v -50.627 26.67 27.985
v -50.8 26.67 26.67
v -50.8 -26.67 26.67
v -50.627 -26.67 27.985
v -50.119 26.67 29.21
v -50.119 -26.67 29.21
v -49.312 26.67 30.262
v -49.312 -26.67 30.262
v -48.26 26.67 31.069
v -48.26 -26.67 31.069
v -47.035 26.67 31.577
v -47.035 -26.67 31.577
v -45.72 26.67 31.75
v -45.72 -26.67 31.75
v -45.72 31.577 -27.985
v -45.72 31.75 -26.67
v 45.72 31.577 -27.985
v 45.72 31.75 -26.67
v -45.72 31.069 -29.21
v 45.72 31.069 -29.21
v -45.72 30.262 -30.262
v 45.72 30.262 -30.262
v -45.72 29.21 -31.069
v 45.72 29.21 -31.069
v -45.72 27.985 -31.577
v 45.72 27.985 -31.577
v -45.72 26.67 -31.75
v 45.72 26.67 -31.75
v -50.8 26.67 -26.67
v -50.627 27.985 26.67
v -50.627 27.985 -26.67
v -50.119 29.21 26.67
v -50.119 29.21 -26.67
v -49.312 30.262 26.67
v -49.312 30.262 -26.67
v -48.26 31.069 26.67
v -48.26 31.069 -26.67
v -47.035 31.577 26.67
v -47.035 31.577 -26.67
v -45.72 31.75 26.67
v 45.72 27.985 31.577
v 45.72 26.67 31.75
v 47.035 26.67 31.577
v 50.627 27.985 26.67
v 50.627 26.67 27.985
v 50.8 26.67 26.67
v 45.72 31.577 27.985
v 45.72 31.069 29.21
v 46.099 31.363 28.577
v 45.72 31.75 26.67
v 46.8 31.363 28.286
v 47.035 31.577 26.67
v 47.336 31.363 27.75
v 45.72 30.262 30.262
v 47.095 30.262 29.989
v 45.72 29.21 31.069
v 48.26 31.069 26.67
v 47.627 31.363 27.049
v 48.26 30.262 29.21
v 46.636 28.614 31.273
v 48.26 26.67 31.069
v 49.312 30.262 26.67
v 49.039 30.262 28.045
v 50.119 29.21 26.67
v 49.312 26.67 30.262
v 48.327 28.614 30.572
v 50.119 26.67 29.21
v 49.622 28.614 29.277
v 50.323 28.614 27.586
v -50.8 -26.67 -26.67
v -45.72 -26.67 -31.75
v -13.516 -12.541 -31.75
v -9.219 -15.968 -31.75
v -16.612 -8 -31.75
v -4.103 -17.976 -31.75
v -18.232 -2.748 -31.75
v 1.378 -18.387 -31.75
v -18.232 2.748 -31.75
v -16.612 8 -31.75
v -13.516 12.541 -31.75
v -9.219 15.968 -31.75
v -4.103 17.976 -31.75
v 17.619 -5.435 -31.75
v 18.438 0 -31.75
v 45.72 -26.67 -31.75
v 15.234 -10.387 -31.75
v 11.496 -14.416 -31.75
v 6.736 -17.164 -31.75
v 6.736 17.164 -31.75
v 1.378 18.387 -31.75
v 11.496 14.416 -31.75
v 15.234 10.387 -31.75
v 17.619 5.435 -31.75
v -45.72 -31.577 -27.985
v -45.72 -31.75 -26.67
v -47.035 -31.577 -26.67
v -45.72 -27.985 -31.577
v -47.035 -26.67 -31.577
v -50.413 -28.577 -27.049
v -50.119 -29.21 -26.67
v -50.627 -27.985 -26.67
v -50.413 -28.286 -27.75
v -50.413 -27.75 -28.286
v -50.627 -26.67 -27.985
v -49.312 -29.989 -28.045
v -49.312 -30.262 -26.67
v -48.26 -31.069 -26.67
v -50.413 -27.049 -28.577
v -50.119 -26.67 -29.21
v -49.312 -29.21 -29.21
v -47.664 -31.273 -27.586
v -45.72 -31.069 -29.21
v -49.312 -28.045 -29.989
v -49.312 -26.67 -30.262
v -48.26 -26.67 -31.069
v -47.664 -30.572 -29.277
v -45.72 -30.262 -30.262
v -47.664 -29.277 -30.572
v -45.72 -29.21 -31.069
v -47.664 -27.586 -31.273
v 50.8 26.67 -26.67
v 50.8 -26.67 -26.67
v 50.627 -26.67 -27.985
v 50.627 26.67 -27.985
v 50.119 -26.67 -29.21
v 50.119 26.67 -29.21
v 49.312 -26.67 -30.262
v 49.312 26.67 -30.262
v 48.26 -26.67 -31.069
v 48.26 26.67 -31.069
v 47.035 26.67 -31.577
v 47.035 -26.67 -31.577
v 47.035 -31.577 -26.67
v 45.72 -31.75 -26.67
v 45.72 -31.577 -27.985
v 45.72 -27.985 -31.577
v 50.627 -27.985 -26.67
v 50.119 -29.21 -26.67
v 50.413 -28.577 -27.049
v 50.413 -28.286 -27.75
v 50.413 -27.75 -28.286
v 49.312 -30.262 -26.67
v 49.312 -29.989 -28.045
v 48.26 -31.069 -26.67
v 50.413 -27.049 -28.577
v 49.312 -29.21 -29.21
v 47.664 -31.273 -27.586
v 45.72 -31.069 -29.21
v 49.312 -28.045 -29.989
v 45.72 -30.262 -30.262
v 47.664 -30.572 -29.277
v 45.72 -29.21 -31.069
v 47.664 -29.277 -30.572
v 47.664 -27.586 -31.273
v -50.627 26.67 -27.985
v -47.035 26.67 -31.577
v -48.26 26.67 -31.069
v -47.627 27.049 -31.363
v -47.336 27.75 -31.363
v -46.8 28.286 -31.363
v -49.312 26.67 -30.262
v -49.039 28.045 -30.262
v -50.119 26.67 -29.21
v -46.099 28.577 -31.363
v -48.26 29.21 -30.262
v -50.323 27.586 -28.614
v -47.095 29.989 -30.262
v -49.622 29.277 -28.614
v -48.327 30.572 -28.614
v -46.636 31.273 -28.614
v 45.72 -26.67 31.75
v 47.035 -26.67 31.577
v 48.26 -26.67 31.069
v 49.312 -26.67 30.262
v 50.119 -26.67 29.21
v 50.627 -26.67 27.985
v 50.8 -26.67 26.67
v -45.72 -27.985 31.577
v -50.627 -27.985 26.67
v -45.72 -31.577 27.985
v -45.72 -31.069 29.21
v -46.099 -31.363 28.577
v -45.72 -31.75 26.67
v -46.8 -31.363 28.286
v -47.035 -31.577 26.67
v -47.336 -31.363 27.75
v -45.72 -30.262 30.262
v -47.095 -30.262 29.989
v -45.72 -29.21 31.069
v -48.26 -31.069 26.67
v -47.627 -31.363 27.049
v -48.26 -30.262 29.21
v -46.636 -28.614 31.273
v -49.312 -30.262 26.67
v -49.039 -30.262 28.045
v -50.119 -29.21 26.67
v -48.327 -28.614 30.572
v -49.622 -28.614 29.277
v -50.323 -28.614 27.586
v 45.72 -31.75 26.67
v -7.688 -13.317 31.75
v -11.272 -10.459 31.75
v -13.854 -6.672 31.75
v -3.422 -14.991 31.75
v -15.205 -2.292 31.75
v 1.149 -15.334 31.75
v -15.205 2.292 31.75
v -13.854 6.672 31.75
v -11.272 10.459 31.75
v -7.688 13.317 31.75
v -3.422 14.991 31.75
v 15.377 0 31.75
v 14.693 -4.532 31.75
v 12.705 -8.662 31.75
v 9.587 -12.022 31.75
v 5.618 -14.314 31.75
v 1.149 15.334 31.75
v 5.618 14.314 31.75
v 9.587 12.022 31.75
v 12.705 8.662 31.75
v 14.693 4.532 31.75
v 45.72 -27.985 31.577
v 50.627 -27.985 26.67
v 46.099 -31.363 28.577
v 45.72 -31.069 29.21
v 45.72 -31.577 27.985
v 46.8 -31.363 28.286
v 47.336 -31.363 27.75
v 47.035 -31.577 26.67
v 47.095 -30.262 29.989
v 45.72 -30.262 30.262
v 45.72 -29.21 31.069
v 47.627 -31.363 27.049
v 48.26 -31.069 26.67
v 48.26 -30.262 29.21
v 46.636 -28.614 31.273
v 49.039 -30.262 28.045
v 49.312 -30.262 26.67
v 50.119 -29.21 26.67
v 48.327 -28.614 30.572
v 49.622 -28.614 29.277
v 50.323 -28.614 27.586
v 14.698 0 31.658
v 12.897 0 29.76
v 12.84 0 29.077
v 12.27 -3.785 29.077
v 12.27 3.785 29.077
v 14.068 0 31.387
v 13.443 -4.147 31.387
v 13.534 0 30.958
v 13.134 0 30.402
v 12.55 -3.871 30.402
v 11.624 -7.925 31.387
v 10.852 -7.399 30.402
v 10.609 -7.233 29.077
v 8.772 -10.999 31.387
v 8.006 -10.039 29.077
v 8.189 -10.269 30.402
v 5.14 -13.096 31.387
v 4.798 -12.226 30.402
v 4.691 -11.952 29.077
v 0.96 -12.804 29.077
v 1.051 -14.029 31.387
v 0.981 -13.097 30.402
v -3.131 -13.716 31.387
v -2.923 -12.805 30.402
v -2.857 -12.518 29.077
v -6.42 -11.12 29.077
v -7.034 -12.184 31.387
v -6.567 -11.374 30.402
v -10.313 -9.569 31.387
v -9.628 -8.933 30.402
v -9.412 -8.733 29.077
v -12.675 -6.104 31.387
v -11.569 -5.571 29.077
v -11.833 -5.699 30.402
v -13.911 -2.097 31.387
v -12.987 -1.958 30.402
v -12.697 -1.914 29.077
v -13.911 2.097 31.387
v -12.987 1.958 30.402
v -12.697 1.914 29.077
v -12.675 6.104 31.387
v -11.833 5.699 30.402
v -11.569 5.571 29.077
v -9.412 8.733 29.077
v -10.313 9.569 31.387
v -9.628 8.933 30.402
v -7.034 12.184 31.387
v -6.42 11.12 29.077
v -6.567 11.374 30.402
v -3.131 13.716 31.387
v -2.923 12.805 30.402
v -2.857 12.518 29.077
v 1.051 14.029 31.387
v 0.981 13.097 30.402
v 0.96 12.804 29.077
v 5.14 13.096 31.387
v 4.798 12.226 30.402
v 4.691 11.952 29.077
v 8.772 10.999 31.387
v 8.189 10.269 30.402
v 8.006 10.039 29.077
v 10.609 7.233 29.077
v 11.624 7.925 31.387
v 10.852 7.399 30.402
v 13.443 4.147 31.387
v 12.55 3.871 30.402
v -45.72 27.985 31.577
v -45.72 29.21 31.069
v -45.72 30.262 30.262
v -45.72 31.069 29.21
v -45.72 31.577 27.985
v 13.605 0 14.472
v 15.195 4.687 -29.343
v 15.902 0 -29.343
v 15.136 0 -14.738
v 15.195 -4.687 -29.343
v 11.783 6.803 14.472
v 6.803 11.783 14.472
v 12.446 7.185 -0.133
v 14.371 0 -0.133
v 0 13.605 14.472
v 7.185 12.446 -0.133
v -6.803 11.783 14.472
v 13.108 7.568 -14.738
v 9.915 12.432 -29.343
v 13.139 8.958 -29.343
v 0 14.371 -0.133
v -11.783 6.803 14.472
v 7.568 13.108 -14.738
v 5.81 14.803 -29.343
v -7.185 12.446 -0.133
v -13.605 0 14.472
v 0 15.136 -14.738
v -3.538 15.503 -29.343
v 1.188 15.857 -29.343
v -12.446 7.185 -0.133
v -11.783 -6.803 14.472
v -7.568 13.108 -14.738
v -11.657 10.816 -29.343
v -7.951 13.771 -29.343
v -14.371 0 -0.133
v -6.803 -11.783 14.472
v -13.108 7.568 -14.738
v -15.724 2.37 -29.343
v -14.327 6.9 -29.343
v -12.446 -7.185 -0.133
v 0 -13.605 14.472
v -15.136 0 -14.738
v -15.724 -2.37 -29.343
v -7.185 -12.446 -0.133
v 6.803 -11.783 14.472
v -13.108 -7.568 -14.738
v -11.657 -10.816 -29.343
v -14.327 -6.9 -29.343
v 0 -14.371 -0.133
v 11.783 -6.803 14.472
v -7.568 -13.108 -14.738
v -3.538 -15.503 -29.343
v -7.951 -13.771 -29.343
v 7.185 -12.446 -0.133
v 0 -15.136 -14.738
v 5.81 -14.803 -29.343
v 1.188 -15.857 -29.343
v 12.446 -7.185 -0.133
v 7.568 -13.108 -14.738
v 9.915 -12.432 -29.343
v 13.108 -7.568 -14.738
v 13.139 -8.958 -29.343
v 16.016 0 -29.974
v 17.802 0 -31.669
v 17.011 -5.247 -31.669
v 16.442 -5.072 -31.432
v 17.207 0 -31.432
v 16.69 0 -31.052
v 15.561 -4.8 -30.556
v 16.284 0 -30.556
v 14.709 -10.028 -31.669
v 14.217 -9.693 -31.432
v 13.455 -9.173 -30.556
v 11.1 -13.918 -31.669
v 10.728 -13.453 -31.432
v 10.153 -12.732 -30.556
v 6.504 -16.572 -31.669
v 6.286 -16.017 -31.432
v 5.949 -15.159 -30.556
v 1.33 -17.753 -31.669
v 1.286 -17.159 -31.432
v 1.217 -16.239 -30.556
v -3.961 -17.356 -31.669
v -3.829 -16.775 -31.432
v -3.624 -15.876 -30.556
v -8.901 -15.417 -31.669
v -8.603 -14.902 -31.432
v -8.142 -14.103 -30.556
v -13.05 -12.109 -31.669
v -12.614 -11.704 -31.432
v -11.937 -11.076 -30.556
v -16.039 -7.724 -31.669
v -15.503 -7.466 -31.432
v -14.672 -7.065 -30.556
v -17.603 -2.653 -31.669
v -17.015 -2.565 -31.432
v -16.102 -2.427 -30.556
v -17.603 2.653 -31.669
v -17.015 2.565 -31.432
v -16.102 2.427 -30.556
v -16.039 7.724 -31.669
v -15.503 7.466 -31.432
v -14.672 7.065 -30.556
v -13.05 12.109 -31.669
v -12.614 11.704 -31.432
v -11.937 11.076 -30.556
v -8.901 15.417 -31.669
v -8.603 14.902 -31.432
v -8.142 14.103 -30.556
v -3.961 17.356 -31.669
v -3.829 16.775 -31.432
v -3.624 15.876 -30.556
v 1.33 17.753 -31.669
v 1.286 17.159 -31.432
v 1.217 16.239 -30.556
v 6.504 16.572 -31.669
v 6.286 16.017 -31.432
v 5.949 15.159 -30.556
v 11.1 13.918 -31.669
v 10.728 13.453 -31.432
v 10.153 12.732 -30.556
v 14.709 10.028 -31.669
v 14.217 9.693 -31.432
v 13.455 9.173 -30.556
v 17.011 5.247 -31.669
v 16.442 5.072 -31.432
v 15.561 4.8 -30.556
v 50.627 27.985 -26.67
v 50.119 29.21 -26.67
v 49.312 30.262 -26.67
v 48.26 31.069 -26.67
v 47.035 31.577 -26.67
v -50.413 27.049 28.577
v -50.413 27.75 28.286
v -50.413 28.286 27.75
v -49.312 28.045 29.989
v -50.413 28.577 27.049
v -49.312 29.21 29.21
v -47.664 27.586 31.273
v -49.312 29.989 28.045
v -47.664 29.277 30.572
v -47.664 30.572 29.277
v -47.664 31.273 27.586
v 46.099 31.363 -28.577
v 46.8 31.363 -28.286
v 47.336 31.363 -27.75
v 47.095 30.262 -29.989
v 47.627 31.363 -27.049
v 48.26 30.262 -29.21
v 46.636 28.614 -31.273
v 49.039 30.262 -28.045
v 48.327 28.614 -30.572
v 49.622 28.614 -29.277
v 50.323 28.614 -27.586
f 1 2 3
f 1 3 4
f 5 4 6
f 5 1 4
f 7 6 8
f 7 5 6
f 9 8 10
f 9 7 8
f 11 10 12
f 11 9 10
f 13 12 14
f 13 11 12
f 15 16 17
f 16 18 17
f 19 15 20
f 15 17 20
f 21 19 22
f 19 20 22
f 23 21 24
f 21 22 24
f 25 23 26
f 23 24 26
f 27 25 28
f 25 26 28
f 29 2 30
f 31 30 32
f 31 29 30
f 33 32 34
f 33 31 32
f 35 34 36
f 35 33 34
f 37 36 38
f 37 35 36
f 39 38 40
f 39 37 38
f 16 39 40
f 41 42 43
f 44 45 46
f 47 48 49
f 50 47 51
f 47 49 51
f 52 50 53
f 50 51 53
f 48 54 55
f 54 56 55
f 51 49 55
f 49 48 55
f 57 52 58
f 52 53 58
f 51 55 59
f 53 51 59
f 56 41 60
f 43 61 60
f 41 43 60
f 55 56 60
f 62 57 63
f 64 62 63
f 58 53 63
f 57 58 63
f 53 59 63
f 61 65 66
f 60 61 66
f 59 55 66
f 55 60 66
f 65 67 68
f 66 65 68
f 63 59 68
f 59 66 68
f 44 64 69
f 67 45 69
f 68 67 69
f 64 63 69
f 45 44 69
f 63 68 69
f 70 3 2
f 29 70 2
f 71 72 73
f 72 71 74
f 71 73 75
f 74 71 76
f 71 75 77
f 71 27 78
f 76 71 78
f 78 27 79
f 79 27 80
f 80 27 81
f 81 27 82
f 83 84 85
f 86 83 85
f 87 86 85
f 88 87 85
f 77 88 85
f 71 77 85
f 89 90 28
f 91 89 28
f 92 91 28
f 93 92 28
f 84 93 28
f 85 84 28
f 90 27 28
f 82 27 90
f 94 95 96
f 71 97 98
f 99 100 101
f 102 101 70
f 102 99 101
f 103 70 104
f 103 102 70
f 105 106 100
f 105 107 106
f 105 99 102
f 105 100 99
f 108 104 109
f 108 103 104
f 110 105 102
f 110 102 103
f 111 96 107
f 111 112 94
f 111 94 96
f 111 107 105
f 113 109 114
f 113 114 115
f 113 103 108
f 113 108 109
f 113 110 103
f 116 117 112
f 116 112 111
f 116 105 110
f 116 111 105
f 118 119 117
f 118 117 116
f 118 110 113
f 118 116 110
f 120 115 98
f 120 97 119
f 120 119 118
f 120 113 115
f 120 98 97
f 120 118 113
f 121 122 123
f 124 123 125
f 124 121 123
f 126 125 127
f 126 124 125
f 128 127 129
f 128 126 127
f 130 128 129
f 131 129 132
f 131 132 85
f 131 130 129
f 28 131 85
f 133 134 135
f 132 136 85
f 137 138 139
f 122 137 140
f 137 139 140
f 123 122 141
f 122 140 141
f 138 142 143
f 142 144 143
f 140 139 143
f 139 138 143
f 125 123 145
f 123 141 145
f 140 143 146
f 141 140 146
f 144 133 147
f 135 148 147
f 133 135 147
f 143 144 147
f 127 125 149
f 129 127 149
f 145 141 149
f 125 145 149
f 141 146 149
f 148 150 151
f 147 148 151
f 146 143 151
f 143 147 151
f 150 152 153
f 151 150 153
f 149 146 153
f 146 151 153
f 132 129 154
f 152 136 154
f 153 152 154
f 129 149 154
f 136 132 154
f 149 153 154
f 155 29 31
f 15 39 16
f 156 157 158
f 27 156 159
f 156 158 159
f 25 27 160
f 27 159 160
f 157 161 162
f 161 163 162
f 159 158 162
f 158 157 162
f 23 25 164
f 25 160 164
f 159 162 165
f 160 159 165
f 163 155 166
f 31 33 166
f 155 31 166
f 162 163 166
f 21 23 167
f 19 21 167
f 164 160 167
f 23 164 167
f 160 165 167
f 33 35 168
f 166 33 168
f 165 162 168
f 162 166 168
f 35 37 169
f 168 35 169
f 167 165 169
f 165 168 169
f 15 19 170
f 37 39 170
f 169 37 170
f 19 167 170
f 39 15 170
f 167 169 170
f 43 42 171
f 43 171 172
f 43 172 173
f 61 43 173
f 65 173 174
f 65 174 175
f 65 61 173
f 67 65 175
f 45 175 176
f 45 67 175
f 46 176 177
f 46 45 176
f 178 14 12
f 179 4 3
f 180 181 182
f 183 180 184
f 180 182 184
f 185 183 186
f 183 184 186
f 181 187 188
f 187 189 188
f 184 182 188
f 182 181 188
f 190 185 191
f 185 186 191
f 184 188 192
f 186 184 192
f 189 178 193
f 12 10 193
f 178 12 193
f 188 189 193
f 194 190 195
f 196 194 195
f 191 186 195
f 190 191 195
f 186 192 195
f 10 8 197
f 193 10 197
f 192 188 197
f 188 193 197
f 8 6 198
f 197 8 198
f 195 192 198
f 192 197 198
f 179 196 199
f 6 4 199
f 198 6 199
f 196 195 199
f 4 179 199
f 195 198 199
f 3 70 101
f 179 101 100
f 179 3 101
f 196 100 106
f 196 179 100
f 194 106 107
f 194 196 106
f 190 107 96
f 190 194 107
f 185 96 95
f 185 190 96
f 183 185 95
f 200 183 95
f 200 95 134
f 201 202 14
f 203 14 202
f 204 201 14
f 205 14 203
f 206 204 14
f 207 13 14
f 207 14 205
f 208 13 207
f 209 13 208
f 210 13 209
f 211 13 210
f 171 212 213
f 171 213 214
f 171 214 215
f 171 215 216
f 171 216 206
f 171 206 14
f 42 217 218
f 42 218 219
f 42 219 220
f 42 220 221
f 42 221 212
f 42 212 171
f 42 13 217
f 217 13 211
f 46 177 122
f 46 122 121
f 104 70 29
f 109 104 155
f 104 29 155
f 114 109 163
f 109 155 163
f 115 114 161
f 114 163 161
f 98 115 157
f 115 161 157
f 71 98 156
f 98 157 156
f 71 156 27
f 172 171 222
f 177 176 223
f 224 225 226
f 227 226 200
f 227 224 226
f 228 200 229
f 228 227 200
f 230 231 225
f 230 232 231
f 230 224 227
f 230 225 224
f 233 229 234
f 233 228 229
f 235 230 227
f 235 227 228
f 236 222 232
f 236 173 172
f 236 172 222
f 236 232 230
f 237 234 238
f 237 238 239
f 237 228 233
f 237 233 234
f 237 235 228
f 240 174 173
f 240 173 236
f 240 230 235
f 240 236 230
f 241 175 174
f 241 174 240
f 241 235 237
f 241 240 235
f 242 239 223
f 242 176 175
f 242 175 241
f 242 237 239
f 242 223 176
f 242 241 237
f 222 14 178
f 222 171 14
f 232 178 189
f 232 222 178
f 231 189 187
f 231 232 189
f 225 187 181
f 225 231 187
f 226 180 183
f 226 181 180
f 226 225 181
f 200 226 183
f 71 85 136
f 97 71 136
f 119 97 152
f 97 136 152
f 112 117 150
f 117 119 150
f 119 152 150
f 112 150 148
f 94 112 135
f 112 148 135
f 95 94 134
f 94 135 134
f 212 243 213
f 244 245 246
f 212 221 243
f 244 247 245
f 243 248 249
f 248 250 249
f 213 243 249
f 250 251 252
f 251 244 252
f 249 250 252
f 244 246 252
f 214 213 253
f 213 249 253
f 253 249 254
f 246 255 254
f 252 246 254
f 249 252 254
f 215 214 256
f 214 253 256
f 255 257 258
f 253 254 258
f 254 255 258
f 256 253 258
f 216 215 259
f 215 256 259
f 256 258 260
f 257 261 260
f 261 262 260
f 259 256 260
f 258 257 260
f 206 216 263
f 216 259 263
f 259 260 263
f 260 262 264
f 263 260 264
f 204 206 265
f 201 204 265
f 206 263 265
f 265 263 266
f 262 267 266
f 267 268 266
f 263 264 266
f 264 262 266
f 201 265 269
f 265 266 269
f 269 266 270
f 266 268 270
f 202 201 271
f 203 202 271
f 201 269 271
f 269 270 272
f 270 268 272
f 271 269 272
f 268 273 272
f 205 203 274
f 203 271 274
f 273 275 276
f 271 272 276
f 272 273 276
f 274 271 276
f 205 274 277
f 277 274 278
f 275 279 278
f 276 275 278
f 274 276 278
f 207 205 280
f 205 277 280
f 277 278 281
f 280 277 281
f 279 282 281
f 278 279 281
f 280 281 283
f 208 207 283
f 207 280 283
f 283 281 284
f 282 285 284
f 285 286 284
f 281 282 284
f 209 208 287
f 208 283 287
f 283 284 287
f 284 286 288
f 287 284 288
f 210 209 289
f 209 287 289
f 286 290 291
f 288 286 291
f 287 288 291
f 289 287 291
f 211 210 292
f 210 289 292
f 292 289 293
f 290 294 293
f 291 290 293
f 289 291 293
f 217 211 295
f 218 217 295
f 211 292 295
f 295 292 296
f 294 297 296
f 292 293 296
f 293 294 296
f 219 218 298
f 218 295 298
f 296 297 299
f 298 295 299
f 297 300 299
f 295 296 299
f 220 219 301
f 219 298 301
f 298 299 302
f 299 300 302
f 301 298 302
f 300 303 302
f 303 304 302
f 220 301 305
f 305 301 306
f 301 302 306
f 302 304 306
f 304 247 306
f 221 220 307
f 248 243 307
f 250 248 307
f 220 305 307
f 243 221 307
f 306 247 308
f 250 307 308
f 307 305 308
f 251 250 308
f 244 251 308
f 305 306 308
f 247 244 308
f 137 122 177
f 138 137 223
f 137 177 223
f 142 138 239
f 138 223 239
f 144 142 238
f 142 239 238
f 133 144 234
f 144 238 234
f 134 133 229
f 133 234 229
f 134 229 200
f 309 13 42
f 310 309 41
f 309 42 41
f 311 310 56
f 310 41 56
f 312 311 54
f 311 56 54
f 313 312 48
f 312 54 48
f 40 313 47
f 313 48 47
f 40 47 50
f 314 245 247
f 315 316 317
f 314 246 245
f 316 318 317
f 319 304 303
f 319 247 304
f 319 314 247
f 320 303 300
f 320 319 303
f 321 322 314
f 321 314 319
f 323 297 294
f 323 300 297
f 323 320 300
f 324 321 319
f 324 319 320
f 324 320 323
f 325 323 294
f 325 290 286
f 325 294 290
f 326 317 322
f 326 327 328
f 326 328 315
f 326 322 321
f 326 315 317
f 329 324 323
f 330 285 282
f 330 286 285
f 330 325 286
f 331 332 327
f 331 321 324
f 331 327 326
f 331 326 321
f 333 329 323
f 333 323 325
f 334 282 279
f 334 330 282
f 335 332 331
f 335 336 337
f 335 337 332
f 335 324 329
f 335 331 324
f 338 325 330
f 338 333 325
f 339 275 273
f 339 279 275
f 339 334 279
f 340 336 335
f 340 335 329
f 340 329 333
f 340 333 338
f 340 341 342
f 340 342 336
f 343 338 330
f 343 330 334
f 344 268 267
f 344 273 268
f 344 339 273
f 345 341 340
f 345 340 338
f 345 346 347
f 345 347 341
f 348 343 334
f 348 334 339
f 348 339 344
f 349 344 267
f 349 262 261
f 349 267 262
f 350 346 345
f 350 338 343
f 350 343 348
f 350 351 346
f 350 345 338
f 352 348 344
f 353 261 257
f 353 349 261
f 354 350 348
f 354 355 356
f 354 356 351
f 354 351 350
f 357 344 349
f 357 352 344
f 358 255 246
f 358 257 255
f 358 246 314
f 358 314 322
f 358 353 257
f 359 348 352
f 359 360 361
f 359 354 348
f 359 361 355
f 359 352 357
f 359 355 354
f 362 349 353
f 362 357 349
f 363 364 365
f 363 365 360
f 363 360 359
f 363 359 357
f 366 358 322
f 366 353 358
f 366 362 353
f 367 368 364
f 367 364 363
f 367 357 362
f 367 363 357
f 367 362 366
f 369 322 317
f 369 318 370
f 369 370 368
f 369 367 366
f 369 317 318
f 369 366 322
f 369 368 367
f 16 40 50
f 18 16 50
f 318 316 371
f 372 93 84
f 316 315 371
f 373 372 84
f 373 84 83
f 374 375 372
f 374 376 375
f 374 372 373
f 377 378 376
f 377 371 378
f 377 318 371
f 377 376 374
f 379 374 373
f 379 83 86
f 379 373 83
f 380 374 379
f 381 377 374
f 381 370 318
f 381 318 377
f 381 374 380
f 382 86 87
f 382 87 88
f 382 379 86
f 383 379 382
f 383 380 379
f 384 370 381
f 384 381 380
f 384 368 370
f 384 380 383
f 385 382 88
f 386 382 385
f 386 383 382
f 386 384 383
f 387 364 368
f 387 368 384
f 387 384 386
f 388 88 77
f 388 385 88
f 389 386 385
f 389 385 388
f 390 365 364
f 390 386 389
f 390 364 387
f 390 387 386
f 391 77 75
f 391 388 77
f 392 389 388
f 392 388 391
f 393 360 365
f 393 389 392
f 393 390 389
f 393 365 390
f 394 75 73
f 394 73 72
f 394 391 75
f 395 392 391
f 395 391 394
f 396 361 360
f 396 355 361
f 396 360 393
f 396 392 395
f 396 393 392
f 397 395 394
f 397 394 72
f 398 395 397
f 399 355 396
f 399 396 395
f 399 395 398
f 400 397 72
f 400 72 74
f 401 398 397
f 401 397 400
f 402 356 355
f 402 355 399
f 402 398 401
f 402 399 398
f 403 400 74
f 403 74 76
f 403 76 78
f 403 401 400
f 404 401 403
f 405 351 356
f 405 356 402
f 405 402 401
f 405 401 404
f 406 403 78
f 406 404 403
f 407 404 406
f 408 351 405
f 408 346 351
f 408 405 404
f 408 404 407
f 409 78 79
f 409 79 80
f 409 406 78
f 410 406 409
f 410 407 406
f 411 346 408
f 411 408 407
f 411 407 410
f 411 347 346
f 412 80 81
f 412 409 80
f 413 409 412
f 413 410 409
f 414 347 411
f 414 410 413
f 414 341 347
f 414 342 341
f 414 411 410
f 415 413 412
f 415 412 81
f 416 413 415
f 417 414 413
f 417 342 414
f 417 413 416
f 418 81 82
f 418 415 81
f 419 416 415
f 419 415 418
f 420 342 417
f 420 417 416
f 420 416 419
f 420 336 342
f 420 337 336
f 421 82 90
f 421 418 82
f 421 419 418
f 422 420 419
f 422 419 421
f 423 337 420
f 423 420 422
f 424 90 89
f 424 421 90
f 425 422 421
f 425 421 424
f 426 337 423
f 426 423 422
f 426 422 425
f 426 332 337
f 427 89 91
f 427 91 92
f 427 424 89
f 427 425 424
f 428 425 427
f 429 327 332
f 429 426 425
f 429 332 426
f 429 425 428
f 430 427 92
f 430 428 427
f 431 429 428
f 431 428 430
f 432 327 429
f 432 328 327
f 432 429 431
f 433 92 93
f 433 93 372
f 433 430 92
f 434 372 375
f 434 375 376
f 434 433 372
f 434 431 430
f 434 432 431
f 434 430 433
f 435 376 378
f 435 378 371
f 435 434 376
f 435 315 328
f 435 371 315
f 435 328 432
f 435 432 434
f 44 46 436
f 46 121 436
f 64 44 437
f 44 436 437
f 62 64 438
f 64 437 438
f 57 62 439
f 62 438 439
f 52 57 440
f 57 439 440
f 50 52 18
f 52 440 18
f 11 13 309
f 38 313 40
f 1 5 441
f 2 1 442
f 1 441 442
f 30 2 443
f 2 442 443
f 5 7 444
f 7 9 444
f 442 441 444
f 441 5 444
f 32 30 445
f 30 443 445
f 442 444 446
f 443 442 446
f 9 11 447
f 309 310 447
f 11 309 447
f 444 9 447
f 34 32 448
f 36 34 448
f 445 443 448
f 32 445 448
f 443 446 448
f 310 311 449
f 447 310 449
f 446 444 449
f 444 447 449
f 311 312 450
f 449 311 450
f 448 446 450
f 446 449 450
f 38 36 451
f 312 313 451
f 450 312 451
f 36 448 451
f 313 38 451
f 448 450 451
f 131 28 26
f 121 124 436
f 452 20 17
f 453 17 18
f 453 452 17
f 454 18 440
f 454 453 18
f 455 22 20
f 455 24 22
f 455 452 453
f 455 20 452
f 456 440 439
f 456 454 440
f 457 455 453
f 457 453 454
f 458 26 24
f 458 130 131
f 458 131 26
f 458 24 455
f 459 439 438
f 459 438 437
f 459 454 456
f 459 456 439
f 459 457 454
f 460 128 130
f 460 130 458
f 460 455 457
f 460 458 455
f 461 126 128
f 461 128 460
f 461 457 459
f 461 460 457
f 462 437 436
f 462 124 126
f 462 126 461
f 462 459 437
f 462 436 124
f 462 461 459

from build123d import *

# Parameters (mm, degrees)
F0_W     = 101.6
F0_H     = 63.5
F1_DEPTH = 31.75
F2_R     = 5.08
F3_R     = 12.7
F4_DEPTH = 86.868
F4_TAPER = -3
F5_R     = 2.54


with BuildPart() as f1:
    # F0 (on Top) → F1 (new body, symmetric)
    with BuildSketch(Plane.XY):
        Rectangle(F0_W, F0_H)
    extrude(amount=F1_DEPTH, both=True)

    # F2
    f2_edges = [f1.edges().sort_by_distance(p)[0] for p in [
        (50.8, 0, 31.75),
        (0, 31.75, 31.75),
        (-50.8, 0, 31.75),
        (0, -31.75, 31.75),
        (0, -31.75, -31.75),
        (50.8, -31.75, 0),
        (-50.8, -31.75, 0),
        (-50.8, 31.75, 0),
        (-50.8, 0, -31.75),
        (50.8, 0, -31.75),
        (0, 31.75, -31.75),
        (50.8, 31.75, 0),
    ]]
    fillet(f2_edges, radius=F2_R)

    # F3 (on face) → F4 (cut)
    with BuildSketch(Plane.XY.offset(31.75)):
        Circle(F3_R)
    extrude(amount=-F4_DEPTH, taper=F4_TAPER, mode=Mode.SUBTRACT)

    # F5
    f5_edges = [f1.edges().sort_by_distance(p)[0] for p in [
        (-12.7, 0, 31.75),
        (-16.027894, 0, -31.75),
    ]]
    fillet(f5_edges, radius=F5_R)


solid = f1.part
